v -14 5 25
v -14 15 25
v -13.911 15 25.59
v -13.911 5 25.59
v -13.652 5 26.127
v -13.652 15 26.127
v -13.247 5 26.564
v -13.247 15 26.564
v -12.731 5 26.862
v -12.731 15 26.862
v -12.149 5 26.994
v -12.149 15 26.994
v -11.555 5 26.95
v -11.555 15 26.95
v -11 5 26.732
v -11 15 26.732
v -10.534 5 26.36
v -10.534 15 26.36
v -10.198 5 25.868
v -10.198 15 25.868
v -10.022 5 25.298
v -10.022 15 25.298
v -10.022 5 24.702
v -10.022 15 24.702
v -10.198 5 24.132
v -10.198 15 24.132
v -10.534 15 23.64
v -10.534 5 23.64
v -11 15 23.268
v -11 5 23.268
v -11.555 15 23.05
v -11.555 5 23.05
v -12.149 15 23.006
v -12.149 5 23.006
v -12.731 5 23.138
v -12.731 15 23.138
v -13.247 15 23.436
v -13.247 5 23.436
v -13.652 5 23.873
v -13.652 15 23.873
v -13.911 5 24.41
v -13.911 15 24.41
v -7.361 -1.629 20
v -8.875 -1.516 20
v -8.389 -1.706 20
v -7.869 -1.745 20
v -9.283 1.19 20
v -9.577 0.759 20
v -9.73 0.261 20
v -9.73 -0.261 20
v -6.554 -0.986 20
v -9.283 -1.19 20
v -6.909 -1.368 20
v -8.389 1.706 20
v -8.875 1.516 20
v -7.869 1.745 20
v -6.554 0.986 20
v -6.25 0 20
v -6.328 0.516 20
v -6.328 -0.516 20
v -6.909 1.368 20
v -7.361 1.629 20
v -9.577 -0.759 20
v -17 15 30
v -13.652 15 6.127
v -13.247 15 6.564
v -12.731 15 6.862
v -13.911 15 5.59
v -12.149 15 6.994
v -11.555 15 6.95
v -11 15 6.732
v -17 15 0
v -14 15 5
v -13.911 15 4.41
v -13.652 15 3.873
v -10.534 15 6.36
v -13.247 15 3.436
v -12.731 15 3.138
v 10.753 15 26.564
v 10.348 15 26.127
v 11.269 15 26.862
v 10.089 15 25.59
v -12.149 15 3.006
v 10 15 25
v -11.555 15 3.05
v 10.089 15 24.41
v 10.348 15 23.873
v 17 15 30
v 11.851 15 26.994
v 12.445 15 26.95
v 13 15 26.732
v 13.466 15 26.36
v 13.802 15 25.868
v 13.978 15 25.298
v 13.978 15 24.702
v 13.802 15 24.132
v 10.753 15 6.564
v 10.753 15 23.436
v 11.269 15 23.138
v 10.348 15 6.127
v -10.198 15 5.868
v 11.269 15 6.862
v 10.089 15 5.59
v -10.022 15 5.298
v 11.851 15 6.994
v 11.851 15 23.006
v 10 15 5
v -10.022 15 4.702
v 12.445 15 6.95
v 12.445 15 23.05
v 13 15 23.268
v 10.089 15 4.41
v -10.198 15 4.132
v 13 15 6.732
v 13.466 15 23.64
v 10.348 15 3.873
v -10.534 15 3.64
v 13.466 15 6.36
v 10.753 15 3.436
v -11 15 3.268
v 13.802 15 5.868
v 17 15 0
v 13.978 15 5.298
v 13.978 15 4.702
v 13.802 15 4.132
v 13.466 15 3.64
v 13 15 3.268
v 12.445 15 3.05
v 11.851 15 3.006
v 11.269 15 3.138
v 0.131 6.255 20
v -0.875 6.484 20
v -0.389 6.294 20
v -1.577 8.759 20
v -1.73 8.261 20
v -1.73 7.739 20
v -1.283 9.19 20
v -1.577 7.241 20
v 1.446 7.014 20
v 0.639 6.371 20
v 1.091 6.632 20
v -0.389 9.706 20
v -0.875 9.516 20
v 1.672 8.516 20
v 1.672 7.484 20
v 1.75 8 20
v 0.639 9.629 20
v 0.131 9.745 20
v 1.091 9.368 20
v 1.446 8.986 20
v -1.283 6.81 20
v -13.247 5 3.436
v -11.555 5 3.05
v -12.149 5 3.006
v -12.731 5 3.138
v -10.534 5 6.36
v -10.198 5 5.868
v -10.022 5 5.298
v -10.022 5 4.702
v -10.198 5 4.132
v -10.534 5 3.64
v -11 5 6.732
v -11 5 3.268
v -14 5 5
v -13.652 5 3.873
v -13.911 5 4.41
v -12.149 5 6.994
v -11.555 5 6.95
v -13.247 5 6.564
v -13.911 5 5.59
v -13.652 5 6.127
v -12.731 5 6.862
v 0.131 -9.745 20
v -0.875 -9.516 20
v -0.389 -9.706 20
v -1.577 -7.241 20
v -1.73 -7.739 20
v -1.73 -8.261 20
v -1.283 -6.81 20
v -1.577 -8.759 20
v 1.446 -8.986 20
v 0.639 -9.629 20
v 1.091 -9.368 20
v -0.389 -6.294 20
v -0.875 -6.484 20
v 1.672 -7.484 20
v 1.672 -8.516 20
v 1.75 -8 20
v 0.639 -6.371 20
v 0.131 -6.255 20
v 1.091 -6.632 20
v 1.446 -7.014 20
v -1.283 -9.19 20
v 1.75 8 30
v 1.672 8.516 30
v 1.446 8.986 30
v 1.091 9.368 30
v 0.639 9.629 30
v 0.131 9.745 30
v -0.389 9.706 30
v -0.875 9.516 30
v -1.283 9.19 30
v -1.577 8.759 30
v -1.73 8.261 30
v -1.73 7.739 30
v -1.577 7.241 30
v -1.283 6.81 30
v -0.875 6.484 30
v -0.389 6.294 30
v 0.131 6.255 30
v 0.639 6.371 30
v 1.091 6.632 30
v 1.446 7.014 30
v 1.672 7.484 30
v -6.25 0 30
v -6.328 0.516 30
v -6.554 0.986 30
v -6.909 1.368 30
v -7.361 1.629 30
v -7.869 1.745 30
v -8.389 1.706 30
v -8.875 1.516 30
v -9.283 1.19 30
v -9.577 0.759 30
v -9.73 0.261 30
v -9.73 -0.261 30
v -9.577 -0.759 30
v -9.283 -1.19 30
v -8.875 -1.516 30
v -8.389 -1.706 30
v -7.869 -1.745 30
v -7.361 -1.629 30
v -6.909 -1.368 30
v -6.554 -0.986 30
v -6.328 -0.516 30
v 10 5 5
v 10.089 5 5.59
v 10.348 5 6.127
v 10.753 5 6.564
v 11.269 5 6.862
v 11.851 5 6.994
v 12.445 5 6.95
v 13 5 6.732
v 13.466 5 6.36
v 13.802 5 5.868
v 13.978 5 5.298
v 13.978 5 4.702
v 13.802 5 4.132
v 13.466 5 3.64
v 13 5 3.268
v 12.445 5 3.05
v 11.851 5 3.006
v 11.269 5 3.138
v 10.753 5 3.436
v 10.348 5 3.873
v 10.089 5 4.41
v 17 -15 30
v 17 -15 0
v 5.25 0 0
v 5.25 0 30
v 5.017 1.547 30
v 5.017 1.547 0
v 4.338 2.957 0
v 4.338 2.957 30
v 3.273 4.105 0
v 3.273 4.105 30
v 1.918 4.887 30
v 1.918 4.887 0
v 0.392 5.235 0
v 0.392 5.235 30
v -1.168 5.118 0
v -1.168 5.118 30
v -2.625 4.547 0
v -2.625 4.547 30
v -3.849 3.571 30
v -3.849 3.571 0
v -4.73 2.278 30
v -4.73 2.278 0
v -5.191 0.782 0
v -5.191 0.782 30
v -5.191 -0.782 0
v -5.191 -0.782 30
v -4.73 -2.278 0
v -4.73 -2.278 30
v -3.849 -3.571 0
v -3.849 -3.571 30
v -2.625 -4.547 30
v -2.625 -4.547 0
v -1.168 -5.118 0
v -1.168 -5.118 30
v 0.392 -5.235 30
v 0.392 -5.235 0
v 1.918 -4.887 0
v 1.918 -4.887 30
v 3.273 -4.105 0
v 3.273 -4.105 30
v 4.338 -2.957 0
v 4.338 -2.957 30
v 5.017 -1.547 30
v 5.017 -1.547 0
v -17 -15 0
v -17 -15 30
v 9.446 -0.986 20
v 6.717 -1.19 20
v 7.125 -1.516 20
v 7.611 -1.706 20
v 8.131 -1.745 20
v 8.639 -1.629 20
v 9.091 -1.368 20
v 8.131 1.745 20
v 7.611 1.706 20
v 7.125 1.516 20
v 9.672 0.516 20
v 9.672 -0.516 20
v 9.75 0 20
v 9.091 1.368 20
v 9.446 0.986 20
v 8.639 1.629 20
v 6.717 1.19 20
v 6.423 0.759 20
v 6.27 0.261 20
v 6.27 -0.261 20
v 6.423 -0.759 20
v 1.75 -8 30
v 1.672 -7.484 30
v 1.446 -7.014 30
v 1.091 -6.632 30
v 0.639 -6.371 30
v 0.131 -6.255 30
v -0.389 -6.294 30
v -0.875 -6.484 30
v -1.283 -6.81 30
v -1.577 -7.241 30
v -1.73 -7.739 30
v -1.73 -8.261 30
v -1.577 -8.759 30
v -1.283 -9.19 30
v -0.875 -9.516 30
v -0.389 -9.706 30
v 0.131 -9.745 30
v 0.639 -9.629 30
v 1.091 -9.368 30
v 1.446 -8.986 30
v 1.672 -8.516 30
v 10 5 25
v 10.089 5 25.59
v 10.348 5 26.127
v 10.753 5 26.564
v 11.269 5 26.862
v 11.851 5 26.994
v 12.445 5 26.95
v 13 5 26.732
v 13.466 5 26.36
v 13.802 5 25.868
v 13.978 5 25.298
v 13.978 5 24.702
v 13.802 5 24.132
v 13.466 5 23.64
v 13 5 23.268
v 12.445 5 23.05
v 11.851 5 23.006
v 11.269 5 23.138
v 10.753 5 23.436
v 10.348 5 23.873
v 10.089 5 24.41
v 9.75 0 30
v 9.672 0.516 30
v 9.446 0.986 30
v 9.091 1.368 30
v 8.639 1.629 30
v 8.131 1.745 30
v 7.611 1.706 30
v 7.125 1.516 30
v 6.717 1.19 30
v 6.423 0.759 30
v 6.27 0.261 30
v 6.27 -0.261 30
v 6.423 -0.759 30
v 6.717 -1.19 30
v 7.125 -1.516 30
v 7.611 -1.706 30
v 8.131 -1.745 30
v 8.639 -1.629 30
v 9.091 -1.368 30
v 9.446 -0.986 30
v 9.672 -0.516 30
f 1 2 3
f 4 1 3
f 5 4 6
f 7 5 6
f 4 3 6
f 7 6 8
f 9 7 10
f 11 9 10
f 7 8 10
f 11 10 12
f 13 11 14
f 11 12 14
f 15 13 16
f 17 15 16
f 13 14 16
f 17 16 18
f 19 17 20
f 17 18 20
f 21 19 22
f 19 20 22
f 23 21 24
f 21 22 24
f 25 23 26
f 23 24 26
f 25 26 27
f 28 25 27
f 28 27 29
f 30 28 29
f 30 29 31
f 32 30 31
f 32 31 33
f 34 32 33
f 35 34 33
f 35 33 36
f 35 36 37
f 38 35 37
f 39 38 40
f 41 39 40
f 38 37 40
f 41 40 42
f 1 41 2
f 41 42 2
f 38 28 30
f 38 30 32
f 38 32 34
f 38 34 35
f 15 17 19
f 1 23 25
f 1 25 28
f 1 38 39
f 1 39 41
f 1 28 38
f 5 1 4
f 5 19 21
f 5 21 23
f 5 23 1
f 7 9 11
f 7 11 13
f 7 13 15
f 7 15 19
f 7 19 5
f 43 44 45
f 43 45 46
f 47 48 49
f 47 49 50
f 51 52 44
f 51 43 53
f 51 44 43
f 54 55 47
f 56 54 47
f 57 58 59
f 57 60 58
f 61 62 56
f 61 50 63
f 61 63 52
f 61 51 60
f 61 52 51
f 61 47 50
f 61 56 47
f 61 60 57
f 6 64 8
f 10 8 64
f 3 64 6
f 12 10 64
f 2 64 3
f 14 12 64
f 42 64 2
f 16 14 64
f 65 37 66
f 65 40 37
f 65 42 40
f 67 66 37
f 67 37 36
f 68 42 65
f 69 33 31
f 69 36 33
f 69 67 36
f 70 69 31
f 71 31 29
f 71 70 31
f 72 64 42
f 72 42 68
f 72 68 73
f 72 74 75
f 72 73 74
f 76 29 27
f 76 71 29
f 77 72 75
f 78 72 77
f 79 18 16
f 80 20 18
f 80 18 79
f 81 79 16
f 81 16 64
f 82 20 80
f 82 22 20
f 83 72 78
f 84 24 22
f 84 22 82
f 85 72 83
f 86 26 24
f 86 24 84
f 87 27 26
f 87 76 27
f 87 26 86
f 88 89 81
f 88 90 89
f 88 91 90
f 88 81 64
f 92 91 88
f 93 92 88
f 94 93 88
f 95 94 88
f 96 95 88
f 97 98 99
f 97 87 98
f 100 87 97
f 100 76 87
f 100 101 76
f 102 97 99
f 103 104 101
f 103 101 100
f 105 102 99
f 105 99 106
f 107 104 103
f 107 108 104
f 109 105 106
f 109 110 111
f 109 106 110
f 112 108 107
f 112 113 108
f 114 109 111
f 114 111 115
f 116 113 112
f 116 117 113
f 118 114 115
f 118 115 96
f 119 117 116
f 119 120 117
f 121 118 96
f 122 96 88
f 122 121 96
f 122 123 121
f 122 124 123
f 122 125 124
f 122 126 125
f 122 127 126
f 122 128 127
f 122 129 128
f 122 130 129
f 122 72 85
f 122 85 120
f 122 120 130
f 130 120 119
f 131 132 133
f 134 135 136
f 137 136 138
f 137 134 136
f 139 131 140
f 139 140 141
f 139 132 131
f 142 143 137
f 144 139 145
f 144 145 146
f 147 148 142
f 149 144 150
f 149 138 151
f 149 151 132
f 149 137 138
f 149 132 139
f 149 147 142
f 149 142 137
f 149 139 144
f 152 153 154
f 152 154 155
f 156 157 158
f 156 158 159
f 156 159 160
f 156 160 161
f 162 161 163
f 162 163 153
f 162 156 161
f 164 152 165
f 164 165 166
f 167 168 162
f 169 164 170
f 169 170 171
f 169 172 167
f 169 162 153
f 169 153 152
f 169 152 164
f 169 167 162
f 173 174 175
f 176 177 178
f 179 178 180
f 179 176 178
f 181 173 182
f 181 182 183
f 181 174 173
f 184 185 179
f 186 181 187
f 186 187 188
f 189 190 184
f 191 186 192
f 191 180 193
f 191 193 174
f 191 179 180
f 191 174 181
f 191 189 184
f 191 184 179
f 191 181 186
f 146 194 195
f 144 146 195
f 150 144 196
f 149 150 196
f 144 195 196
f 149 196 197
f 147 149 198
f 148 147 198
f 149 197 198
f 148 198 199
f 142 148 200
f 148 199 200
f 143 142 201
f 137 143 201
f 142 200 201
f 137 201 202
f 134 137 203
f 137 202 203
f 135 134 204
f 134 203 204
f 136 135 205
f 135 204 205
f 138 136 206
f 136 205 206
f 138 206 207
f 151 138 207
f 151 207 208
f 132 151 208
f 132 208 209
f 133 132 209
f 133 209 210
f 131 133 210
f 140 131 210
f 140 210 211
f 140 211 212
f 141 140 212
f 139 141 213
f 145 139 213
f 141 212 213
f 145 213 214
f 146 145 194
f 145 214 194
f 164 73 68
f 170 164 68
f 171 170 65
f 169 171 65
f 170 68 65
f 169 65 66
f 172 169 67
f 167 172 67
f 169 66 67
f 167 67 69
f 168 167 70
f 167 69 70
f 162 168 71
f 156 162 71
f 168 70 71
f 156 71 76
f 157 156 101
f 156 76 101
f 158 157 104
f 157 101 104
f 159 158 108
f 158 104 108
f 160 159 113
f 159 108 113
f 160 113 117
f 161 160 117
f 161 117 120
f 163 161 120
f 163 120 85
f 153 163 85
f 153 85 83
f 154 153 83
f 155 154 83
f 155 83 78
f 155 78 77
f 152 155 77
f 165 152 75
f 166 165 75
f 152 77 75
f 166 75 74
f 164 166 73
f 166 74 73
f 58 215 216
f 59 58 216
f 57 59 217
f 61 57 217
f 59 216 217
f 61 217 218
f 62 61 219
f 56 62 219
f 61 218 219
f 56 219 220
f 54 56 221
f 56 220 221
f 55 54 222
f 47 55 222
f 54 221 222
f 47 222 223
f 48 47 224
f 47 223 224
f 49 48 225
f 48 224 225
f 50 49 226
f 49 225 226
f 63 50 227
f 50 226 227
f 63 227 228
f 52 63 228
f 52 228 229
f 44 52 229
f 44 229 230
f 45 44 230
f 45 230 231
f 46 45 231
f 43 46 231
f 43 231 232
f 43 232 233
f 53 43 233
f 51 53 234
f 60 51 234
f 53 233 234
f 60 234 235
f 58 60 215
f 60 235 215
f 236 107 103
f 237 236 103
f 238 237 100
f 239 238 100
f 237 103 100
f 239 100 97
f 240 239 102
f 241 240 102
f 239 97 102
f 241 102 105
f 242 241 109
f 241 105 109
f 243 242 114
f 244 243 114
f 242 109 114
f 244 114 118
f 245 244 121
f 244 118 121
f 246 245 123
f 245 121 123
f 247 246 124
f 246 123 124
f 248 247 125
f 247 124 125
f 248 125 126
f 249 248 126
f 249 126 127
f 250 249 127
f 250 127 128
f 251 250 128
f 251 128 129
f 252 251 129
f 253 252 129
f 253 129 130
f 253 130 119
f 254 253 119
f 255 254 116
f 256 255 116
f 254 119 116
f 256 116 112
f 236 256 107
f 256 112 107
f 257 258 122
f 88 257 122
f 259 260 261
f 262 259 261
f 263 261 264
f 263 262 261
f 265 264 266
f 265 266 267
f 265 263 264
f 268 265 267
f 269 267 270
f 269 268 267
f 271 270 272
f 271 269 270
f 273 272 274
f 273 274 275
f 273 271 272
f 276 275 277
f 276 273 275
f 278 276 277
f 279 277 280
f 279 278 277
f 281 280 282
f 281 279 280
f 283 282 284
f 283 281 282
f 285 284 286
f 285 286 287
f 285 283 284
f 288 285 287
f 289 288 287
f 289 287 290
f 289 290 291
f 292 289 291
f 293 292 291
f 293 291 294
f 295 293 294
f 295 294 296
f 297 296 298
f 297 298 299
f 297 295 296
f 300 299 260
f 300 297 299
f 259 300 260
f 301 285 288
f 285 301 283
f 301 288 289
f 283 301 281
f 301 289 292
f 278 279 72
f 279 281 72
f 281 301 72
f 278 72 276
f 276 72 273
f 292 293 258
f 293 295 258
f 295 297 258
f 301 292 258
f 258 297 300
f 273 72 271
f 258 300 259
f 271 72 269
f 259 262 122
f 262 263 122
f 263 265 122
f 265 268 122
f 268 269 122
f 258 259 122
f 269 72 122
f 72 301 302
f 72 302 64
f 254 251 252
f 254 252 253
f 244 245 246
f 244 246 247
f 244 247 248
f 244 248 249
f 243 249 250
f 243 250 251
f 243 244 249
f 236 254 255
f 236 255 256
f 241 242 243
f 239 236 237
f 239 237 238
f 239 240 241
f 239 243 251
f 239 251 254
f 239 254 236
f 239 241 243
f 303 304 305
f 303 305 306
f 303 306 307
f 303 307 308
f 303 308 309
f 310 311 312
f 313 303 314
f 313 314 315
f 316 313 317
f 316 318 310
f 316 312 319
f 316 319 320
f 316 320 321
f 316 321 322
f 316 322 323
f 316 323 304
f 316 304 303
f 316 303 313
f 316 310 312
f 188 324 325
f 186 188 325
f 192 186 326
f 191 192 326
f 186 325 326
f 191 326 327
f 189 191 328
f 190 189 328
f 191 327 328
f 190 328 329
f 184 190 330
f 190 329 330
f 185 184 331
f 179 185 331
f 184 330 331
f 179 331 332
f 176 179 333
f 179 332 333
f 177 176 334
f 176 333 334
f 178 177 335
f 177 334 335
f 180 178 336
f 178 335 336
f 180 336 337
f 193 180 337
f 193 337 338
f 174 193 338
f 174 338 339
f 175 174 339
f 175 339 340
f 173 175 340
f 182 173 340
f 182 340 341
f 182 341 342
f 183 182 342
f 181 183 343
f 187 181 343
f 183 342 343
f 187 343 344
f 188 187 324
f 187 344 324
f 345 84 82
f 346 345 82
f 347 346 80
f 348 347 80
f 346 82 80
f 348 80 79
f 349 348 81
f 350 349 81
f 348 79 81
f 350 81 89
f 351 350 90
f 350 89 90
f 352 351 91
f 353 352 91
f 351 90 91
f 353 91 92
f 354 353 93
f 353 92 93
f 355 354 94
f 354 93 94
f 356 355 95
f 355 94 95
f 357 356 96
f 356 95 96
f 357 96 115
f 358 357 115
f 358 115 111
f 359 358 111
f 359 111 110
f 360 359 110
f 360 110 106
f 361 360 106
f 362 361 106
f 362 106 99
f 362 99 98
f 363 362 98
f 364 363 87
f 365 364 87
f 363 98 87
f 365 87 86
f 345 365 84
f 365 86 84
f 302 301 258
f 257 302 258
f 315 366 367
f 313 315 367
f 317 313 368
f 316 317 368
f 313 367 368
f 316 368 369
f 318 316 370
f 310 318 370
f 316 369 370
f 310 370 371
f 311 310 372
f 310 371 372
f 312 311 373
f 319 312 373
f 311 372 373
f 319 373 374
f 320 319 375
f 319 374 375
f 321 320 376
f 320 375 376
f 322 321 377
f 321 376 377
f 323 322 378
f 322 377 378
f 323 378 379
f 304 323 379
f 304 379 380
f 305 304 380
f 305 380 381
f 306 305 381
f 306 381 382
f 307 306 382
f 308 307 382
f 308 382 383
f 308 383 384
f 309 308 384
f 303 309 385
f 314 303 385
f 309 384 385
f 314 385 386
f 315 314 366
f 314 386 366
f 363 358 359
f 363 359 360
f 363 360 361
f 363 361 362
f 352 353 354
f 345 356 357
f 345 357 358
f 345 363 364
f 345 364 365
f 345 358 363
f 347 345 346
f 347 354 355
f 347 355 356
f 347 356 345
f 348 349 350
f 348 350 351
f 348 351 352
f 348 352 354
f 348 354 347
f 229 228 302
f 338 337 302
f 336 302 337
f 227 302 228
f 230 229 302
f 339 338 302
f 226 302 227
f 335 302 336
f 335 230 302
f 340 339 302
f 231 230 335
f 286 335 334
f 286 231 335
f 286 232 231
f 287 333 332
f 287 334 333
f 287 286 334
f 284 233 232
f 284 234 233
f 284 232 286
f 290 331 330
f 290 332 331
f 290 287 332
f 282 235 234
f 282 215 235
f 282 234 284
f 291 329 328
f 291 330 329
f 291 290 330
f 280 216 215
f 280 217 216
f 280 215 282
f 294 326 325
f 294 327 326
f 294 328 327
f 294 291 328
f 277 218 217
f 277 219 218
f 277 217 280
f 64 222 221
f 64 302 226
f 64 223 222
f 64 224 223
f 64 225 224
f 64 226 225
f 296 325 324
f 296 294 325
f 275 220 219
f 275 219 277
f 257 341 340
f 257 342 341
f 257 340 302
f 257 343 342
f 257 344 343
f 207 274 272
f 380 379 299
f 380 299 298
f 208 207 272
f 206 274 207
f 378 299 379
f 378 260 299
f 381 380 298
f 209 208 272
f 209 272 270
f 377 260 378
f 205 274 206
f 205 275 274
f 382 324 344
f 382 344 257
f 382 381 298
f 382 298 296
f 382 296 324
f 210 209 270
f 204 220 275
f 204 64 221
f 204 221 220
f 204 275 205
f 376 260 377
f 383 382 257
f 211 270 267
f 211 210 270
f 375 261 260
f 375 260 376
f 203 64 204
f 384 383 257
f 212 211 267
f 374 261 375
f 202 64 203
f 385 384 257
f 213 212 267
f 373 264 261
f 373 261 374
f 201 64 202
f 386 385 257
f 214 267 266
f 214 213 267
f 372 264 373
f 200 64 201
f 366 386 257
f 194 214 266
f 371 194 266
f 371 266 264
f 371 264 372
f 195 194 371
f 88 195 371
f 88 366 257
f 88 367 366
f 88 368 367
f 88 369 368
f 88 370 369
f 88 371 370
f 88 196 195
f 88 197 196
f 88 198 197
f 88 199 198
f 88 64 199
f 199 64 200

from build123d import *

# Parameters (mm, degrees)
SKETCH_1_W          = 34
SKETCH_1_H          = 30
SKETCH_1_R          = 5.25
EXTRUDE_1_DEPTH     = 30
SKETCH_2_R          = 1.75
CUT_EXTRUDE_1_DEPTH = 10
SKETCH_4_R          = 2
CUT_EXTRUDE_3_DEPTH = 10


with BuildPart() as part:
    # 草图1 → 凸台-拉伸1 (new body)
    with BuildSketch(Plane.XY):
        Rectangle(SKETCH_1_W, SKETCH_1_H)
        Circle(SKETCH_1_R, mode=Mode.SUBTRACT)
    extrude(amount=EXTRUDE_1_DEPTH)

    # 草图2 → 切除-拉伸1 (cut)
    with BuildSketch(Plane.XY.offset(30)):
        with Locations((-8, 0)):
            Circle(SKETCH_2_R)
        with Locations((0, 8)):
            Circle(SKETCH_2_R)
        with Locations((8, 0)):
            Circle(SKETCH_2_R)
        with Locations((0, -8)):
            Circle(SKETCH_2_R)
    extrude(amount=-CUT_EXTRUDE_1_DEPTH, mode=Mode.SUBTRACT)

    # 草图4 → 切除-拉伸3 (cut)
    with BuildSketch(Plane(origin=(0, 15, 0), x_dir=(1, 0, 0), z_dir=(0, 1, 0))):
        with Locations(Location((12, -25, 0), (0, 0, 180))):
            Circle(SKETCH_4_R)
        with Locations(Location((-12, -25, 0), (0, 0, 180))):
            Circle(SKETCH_4_R)
        with Locations(Location((-12, -5, 0), (0, 0, 180))):
            Circle(SKETCH_4_R)
        with Locations(Location((12, -5, 0), (0, 0, 180))):
            Circle(SKETCH_4_R)
    extrude(amount=-CUT_EXTRUDE_3_DEPTH, mode=Mode.SUBTRACT)


solid = part.part
